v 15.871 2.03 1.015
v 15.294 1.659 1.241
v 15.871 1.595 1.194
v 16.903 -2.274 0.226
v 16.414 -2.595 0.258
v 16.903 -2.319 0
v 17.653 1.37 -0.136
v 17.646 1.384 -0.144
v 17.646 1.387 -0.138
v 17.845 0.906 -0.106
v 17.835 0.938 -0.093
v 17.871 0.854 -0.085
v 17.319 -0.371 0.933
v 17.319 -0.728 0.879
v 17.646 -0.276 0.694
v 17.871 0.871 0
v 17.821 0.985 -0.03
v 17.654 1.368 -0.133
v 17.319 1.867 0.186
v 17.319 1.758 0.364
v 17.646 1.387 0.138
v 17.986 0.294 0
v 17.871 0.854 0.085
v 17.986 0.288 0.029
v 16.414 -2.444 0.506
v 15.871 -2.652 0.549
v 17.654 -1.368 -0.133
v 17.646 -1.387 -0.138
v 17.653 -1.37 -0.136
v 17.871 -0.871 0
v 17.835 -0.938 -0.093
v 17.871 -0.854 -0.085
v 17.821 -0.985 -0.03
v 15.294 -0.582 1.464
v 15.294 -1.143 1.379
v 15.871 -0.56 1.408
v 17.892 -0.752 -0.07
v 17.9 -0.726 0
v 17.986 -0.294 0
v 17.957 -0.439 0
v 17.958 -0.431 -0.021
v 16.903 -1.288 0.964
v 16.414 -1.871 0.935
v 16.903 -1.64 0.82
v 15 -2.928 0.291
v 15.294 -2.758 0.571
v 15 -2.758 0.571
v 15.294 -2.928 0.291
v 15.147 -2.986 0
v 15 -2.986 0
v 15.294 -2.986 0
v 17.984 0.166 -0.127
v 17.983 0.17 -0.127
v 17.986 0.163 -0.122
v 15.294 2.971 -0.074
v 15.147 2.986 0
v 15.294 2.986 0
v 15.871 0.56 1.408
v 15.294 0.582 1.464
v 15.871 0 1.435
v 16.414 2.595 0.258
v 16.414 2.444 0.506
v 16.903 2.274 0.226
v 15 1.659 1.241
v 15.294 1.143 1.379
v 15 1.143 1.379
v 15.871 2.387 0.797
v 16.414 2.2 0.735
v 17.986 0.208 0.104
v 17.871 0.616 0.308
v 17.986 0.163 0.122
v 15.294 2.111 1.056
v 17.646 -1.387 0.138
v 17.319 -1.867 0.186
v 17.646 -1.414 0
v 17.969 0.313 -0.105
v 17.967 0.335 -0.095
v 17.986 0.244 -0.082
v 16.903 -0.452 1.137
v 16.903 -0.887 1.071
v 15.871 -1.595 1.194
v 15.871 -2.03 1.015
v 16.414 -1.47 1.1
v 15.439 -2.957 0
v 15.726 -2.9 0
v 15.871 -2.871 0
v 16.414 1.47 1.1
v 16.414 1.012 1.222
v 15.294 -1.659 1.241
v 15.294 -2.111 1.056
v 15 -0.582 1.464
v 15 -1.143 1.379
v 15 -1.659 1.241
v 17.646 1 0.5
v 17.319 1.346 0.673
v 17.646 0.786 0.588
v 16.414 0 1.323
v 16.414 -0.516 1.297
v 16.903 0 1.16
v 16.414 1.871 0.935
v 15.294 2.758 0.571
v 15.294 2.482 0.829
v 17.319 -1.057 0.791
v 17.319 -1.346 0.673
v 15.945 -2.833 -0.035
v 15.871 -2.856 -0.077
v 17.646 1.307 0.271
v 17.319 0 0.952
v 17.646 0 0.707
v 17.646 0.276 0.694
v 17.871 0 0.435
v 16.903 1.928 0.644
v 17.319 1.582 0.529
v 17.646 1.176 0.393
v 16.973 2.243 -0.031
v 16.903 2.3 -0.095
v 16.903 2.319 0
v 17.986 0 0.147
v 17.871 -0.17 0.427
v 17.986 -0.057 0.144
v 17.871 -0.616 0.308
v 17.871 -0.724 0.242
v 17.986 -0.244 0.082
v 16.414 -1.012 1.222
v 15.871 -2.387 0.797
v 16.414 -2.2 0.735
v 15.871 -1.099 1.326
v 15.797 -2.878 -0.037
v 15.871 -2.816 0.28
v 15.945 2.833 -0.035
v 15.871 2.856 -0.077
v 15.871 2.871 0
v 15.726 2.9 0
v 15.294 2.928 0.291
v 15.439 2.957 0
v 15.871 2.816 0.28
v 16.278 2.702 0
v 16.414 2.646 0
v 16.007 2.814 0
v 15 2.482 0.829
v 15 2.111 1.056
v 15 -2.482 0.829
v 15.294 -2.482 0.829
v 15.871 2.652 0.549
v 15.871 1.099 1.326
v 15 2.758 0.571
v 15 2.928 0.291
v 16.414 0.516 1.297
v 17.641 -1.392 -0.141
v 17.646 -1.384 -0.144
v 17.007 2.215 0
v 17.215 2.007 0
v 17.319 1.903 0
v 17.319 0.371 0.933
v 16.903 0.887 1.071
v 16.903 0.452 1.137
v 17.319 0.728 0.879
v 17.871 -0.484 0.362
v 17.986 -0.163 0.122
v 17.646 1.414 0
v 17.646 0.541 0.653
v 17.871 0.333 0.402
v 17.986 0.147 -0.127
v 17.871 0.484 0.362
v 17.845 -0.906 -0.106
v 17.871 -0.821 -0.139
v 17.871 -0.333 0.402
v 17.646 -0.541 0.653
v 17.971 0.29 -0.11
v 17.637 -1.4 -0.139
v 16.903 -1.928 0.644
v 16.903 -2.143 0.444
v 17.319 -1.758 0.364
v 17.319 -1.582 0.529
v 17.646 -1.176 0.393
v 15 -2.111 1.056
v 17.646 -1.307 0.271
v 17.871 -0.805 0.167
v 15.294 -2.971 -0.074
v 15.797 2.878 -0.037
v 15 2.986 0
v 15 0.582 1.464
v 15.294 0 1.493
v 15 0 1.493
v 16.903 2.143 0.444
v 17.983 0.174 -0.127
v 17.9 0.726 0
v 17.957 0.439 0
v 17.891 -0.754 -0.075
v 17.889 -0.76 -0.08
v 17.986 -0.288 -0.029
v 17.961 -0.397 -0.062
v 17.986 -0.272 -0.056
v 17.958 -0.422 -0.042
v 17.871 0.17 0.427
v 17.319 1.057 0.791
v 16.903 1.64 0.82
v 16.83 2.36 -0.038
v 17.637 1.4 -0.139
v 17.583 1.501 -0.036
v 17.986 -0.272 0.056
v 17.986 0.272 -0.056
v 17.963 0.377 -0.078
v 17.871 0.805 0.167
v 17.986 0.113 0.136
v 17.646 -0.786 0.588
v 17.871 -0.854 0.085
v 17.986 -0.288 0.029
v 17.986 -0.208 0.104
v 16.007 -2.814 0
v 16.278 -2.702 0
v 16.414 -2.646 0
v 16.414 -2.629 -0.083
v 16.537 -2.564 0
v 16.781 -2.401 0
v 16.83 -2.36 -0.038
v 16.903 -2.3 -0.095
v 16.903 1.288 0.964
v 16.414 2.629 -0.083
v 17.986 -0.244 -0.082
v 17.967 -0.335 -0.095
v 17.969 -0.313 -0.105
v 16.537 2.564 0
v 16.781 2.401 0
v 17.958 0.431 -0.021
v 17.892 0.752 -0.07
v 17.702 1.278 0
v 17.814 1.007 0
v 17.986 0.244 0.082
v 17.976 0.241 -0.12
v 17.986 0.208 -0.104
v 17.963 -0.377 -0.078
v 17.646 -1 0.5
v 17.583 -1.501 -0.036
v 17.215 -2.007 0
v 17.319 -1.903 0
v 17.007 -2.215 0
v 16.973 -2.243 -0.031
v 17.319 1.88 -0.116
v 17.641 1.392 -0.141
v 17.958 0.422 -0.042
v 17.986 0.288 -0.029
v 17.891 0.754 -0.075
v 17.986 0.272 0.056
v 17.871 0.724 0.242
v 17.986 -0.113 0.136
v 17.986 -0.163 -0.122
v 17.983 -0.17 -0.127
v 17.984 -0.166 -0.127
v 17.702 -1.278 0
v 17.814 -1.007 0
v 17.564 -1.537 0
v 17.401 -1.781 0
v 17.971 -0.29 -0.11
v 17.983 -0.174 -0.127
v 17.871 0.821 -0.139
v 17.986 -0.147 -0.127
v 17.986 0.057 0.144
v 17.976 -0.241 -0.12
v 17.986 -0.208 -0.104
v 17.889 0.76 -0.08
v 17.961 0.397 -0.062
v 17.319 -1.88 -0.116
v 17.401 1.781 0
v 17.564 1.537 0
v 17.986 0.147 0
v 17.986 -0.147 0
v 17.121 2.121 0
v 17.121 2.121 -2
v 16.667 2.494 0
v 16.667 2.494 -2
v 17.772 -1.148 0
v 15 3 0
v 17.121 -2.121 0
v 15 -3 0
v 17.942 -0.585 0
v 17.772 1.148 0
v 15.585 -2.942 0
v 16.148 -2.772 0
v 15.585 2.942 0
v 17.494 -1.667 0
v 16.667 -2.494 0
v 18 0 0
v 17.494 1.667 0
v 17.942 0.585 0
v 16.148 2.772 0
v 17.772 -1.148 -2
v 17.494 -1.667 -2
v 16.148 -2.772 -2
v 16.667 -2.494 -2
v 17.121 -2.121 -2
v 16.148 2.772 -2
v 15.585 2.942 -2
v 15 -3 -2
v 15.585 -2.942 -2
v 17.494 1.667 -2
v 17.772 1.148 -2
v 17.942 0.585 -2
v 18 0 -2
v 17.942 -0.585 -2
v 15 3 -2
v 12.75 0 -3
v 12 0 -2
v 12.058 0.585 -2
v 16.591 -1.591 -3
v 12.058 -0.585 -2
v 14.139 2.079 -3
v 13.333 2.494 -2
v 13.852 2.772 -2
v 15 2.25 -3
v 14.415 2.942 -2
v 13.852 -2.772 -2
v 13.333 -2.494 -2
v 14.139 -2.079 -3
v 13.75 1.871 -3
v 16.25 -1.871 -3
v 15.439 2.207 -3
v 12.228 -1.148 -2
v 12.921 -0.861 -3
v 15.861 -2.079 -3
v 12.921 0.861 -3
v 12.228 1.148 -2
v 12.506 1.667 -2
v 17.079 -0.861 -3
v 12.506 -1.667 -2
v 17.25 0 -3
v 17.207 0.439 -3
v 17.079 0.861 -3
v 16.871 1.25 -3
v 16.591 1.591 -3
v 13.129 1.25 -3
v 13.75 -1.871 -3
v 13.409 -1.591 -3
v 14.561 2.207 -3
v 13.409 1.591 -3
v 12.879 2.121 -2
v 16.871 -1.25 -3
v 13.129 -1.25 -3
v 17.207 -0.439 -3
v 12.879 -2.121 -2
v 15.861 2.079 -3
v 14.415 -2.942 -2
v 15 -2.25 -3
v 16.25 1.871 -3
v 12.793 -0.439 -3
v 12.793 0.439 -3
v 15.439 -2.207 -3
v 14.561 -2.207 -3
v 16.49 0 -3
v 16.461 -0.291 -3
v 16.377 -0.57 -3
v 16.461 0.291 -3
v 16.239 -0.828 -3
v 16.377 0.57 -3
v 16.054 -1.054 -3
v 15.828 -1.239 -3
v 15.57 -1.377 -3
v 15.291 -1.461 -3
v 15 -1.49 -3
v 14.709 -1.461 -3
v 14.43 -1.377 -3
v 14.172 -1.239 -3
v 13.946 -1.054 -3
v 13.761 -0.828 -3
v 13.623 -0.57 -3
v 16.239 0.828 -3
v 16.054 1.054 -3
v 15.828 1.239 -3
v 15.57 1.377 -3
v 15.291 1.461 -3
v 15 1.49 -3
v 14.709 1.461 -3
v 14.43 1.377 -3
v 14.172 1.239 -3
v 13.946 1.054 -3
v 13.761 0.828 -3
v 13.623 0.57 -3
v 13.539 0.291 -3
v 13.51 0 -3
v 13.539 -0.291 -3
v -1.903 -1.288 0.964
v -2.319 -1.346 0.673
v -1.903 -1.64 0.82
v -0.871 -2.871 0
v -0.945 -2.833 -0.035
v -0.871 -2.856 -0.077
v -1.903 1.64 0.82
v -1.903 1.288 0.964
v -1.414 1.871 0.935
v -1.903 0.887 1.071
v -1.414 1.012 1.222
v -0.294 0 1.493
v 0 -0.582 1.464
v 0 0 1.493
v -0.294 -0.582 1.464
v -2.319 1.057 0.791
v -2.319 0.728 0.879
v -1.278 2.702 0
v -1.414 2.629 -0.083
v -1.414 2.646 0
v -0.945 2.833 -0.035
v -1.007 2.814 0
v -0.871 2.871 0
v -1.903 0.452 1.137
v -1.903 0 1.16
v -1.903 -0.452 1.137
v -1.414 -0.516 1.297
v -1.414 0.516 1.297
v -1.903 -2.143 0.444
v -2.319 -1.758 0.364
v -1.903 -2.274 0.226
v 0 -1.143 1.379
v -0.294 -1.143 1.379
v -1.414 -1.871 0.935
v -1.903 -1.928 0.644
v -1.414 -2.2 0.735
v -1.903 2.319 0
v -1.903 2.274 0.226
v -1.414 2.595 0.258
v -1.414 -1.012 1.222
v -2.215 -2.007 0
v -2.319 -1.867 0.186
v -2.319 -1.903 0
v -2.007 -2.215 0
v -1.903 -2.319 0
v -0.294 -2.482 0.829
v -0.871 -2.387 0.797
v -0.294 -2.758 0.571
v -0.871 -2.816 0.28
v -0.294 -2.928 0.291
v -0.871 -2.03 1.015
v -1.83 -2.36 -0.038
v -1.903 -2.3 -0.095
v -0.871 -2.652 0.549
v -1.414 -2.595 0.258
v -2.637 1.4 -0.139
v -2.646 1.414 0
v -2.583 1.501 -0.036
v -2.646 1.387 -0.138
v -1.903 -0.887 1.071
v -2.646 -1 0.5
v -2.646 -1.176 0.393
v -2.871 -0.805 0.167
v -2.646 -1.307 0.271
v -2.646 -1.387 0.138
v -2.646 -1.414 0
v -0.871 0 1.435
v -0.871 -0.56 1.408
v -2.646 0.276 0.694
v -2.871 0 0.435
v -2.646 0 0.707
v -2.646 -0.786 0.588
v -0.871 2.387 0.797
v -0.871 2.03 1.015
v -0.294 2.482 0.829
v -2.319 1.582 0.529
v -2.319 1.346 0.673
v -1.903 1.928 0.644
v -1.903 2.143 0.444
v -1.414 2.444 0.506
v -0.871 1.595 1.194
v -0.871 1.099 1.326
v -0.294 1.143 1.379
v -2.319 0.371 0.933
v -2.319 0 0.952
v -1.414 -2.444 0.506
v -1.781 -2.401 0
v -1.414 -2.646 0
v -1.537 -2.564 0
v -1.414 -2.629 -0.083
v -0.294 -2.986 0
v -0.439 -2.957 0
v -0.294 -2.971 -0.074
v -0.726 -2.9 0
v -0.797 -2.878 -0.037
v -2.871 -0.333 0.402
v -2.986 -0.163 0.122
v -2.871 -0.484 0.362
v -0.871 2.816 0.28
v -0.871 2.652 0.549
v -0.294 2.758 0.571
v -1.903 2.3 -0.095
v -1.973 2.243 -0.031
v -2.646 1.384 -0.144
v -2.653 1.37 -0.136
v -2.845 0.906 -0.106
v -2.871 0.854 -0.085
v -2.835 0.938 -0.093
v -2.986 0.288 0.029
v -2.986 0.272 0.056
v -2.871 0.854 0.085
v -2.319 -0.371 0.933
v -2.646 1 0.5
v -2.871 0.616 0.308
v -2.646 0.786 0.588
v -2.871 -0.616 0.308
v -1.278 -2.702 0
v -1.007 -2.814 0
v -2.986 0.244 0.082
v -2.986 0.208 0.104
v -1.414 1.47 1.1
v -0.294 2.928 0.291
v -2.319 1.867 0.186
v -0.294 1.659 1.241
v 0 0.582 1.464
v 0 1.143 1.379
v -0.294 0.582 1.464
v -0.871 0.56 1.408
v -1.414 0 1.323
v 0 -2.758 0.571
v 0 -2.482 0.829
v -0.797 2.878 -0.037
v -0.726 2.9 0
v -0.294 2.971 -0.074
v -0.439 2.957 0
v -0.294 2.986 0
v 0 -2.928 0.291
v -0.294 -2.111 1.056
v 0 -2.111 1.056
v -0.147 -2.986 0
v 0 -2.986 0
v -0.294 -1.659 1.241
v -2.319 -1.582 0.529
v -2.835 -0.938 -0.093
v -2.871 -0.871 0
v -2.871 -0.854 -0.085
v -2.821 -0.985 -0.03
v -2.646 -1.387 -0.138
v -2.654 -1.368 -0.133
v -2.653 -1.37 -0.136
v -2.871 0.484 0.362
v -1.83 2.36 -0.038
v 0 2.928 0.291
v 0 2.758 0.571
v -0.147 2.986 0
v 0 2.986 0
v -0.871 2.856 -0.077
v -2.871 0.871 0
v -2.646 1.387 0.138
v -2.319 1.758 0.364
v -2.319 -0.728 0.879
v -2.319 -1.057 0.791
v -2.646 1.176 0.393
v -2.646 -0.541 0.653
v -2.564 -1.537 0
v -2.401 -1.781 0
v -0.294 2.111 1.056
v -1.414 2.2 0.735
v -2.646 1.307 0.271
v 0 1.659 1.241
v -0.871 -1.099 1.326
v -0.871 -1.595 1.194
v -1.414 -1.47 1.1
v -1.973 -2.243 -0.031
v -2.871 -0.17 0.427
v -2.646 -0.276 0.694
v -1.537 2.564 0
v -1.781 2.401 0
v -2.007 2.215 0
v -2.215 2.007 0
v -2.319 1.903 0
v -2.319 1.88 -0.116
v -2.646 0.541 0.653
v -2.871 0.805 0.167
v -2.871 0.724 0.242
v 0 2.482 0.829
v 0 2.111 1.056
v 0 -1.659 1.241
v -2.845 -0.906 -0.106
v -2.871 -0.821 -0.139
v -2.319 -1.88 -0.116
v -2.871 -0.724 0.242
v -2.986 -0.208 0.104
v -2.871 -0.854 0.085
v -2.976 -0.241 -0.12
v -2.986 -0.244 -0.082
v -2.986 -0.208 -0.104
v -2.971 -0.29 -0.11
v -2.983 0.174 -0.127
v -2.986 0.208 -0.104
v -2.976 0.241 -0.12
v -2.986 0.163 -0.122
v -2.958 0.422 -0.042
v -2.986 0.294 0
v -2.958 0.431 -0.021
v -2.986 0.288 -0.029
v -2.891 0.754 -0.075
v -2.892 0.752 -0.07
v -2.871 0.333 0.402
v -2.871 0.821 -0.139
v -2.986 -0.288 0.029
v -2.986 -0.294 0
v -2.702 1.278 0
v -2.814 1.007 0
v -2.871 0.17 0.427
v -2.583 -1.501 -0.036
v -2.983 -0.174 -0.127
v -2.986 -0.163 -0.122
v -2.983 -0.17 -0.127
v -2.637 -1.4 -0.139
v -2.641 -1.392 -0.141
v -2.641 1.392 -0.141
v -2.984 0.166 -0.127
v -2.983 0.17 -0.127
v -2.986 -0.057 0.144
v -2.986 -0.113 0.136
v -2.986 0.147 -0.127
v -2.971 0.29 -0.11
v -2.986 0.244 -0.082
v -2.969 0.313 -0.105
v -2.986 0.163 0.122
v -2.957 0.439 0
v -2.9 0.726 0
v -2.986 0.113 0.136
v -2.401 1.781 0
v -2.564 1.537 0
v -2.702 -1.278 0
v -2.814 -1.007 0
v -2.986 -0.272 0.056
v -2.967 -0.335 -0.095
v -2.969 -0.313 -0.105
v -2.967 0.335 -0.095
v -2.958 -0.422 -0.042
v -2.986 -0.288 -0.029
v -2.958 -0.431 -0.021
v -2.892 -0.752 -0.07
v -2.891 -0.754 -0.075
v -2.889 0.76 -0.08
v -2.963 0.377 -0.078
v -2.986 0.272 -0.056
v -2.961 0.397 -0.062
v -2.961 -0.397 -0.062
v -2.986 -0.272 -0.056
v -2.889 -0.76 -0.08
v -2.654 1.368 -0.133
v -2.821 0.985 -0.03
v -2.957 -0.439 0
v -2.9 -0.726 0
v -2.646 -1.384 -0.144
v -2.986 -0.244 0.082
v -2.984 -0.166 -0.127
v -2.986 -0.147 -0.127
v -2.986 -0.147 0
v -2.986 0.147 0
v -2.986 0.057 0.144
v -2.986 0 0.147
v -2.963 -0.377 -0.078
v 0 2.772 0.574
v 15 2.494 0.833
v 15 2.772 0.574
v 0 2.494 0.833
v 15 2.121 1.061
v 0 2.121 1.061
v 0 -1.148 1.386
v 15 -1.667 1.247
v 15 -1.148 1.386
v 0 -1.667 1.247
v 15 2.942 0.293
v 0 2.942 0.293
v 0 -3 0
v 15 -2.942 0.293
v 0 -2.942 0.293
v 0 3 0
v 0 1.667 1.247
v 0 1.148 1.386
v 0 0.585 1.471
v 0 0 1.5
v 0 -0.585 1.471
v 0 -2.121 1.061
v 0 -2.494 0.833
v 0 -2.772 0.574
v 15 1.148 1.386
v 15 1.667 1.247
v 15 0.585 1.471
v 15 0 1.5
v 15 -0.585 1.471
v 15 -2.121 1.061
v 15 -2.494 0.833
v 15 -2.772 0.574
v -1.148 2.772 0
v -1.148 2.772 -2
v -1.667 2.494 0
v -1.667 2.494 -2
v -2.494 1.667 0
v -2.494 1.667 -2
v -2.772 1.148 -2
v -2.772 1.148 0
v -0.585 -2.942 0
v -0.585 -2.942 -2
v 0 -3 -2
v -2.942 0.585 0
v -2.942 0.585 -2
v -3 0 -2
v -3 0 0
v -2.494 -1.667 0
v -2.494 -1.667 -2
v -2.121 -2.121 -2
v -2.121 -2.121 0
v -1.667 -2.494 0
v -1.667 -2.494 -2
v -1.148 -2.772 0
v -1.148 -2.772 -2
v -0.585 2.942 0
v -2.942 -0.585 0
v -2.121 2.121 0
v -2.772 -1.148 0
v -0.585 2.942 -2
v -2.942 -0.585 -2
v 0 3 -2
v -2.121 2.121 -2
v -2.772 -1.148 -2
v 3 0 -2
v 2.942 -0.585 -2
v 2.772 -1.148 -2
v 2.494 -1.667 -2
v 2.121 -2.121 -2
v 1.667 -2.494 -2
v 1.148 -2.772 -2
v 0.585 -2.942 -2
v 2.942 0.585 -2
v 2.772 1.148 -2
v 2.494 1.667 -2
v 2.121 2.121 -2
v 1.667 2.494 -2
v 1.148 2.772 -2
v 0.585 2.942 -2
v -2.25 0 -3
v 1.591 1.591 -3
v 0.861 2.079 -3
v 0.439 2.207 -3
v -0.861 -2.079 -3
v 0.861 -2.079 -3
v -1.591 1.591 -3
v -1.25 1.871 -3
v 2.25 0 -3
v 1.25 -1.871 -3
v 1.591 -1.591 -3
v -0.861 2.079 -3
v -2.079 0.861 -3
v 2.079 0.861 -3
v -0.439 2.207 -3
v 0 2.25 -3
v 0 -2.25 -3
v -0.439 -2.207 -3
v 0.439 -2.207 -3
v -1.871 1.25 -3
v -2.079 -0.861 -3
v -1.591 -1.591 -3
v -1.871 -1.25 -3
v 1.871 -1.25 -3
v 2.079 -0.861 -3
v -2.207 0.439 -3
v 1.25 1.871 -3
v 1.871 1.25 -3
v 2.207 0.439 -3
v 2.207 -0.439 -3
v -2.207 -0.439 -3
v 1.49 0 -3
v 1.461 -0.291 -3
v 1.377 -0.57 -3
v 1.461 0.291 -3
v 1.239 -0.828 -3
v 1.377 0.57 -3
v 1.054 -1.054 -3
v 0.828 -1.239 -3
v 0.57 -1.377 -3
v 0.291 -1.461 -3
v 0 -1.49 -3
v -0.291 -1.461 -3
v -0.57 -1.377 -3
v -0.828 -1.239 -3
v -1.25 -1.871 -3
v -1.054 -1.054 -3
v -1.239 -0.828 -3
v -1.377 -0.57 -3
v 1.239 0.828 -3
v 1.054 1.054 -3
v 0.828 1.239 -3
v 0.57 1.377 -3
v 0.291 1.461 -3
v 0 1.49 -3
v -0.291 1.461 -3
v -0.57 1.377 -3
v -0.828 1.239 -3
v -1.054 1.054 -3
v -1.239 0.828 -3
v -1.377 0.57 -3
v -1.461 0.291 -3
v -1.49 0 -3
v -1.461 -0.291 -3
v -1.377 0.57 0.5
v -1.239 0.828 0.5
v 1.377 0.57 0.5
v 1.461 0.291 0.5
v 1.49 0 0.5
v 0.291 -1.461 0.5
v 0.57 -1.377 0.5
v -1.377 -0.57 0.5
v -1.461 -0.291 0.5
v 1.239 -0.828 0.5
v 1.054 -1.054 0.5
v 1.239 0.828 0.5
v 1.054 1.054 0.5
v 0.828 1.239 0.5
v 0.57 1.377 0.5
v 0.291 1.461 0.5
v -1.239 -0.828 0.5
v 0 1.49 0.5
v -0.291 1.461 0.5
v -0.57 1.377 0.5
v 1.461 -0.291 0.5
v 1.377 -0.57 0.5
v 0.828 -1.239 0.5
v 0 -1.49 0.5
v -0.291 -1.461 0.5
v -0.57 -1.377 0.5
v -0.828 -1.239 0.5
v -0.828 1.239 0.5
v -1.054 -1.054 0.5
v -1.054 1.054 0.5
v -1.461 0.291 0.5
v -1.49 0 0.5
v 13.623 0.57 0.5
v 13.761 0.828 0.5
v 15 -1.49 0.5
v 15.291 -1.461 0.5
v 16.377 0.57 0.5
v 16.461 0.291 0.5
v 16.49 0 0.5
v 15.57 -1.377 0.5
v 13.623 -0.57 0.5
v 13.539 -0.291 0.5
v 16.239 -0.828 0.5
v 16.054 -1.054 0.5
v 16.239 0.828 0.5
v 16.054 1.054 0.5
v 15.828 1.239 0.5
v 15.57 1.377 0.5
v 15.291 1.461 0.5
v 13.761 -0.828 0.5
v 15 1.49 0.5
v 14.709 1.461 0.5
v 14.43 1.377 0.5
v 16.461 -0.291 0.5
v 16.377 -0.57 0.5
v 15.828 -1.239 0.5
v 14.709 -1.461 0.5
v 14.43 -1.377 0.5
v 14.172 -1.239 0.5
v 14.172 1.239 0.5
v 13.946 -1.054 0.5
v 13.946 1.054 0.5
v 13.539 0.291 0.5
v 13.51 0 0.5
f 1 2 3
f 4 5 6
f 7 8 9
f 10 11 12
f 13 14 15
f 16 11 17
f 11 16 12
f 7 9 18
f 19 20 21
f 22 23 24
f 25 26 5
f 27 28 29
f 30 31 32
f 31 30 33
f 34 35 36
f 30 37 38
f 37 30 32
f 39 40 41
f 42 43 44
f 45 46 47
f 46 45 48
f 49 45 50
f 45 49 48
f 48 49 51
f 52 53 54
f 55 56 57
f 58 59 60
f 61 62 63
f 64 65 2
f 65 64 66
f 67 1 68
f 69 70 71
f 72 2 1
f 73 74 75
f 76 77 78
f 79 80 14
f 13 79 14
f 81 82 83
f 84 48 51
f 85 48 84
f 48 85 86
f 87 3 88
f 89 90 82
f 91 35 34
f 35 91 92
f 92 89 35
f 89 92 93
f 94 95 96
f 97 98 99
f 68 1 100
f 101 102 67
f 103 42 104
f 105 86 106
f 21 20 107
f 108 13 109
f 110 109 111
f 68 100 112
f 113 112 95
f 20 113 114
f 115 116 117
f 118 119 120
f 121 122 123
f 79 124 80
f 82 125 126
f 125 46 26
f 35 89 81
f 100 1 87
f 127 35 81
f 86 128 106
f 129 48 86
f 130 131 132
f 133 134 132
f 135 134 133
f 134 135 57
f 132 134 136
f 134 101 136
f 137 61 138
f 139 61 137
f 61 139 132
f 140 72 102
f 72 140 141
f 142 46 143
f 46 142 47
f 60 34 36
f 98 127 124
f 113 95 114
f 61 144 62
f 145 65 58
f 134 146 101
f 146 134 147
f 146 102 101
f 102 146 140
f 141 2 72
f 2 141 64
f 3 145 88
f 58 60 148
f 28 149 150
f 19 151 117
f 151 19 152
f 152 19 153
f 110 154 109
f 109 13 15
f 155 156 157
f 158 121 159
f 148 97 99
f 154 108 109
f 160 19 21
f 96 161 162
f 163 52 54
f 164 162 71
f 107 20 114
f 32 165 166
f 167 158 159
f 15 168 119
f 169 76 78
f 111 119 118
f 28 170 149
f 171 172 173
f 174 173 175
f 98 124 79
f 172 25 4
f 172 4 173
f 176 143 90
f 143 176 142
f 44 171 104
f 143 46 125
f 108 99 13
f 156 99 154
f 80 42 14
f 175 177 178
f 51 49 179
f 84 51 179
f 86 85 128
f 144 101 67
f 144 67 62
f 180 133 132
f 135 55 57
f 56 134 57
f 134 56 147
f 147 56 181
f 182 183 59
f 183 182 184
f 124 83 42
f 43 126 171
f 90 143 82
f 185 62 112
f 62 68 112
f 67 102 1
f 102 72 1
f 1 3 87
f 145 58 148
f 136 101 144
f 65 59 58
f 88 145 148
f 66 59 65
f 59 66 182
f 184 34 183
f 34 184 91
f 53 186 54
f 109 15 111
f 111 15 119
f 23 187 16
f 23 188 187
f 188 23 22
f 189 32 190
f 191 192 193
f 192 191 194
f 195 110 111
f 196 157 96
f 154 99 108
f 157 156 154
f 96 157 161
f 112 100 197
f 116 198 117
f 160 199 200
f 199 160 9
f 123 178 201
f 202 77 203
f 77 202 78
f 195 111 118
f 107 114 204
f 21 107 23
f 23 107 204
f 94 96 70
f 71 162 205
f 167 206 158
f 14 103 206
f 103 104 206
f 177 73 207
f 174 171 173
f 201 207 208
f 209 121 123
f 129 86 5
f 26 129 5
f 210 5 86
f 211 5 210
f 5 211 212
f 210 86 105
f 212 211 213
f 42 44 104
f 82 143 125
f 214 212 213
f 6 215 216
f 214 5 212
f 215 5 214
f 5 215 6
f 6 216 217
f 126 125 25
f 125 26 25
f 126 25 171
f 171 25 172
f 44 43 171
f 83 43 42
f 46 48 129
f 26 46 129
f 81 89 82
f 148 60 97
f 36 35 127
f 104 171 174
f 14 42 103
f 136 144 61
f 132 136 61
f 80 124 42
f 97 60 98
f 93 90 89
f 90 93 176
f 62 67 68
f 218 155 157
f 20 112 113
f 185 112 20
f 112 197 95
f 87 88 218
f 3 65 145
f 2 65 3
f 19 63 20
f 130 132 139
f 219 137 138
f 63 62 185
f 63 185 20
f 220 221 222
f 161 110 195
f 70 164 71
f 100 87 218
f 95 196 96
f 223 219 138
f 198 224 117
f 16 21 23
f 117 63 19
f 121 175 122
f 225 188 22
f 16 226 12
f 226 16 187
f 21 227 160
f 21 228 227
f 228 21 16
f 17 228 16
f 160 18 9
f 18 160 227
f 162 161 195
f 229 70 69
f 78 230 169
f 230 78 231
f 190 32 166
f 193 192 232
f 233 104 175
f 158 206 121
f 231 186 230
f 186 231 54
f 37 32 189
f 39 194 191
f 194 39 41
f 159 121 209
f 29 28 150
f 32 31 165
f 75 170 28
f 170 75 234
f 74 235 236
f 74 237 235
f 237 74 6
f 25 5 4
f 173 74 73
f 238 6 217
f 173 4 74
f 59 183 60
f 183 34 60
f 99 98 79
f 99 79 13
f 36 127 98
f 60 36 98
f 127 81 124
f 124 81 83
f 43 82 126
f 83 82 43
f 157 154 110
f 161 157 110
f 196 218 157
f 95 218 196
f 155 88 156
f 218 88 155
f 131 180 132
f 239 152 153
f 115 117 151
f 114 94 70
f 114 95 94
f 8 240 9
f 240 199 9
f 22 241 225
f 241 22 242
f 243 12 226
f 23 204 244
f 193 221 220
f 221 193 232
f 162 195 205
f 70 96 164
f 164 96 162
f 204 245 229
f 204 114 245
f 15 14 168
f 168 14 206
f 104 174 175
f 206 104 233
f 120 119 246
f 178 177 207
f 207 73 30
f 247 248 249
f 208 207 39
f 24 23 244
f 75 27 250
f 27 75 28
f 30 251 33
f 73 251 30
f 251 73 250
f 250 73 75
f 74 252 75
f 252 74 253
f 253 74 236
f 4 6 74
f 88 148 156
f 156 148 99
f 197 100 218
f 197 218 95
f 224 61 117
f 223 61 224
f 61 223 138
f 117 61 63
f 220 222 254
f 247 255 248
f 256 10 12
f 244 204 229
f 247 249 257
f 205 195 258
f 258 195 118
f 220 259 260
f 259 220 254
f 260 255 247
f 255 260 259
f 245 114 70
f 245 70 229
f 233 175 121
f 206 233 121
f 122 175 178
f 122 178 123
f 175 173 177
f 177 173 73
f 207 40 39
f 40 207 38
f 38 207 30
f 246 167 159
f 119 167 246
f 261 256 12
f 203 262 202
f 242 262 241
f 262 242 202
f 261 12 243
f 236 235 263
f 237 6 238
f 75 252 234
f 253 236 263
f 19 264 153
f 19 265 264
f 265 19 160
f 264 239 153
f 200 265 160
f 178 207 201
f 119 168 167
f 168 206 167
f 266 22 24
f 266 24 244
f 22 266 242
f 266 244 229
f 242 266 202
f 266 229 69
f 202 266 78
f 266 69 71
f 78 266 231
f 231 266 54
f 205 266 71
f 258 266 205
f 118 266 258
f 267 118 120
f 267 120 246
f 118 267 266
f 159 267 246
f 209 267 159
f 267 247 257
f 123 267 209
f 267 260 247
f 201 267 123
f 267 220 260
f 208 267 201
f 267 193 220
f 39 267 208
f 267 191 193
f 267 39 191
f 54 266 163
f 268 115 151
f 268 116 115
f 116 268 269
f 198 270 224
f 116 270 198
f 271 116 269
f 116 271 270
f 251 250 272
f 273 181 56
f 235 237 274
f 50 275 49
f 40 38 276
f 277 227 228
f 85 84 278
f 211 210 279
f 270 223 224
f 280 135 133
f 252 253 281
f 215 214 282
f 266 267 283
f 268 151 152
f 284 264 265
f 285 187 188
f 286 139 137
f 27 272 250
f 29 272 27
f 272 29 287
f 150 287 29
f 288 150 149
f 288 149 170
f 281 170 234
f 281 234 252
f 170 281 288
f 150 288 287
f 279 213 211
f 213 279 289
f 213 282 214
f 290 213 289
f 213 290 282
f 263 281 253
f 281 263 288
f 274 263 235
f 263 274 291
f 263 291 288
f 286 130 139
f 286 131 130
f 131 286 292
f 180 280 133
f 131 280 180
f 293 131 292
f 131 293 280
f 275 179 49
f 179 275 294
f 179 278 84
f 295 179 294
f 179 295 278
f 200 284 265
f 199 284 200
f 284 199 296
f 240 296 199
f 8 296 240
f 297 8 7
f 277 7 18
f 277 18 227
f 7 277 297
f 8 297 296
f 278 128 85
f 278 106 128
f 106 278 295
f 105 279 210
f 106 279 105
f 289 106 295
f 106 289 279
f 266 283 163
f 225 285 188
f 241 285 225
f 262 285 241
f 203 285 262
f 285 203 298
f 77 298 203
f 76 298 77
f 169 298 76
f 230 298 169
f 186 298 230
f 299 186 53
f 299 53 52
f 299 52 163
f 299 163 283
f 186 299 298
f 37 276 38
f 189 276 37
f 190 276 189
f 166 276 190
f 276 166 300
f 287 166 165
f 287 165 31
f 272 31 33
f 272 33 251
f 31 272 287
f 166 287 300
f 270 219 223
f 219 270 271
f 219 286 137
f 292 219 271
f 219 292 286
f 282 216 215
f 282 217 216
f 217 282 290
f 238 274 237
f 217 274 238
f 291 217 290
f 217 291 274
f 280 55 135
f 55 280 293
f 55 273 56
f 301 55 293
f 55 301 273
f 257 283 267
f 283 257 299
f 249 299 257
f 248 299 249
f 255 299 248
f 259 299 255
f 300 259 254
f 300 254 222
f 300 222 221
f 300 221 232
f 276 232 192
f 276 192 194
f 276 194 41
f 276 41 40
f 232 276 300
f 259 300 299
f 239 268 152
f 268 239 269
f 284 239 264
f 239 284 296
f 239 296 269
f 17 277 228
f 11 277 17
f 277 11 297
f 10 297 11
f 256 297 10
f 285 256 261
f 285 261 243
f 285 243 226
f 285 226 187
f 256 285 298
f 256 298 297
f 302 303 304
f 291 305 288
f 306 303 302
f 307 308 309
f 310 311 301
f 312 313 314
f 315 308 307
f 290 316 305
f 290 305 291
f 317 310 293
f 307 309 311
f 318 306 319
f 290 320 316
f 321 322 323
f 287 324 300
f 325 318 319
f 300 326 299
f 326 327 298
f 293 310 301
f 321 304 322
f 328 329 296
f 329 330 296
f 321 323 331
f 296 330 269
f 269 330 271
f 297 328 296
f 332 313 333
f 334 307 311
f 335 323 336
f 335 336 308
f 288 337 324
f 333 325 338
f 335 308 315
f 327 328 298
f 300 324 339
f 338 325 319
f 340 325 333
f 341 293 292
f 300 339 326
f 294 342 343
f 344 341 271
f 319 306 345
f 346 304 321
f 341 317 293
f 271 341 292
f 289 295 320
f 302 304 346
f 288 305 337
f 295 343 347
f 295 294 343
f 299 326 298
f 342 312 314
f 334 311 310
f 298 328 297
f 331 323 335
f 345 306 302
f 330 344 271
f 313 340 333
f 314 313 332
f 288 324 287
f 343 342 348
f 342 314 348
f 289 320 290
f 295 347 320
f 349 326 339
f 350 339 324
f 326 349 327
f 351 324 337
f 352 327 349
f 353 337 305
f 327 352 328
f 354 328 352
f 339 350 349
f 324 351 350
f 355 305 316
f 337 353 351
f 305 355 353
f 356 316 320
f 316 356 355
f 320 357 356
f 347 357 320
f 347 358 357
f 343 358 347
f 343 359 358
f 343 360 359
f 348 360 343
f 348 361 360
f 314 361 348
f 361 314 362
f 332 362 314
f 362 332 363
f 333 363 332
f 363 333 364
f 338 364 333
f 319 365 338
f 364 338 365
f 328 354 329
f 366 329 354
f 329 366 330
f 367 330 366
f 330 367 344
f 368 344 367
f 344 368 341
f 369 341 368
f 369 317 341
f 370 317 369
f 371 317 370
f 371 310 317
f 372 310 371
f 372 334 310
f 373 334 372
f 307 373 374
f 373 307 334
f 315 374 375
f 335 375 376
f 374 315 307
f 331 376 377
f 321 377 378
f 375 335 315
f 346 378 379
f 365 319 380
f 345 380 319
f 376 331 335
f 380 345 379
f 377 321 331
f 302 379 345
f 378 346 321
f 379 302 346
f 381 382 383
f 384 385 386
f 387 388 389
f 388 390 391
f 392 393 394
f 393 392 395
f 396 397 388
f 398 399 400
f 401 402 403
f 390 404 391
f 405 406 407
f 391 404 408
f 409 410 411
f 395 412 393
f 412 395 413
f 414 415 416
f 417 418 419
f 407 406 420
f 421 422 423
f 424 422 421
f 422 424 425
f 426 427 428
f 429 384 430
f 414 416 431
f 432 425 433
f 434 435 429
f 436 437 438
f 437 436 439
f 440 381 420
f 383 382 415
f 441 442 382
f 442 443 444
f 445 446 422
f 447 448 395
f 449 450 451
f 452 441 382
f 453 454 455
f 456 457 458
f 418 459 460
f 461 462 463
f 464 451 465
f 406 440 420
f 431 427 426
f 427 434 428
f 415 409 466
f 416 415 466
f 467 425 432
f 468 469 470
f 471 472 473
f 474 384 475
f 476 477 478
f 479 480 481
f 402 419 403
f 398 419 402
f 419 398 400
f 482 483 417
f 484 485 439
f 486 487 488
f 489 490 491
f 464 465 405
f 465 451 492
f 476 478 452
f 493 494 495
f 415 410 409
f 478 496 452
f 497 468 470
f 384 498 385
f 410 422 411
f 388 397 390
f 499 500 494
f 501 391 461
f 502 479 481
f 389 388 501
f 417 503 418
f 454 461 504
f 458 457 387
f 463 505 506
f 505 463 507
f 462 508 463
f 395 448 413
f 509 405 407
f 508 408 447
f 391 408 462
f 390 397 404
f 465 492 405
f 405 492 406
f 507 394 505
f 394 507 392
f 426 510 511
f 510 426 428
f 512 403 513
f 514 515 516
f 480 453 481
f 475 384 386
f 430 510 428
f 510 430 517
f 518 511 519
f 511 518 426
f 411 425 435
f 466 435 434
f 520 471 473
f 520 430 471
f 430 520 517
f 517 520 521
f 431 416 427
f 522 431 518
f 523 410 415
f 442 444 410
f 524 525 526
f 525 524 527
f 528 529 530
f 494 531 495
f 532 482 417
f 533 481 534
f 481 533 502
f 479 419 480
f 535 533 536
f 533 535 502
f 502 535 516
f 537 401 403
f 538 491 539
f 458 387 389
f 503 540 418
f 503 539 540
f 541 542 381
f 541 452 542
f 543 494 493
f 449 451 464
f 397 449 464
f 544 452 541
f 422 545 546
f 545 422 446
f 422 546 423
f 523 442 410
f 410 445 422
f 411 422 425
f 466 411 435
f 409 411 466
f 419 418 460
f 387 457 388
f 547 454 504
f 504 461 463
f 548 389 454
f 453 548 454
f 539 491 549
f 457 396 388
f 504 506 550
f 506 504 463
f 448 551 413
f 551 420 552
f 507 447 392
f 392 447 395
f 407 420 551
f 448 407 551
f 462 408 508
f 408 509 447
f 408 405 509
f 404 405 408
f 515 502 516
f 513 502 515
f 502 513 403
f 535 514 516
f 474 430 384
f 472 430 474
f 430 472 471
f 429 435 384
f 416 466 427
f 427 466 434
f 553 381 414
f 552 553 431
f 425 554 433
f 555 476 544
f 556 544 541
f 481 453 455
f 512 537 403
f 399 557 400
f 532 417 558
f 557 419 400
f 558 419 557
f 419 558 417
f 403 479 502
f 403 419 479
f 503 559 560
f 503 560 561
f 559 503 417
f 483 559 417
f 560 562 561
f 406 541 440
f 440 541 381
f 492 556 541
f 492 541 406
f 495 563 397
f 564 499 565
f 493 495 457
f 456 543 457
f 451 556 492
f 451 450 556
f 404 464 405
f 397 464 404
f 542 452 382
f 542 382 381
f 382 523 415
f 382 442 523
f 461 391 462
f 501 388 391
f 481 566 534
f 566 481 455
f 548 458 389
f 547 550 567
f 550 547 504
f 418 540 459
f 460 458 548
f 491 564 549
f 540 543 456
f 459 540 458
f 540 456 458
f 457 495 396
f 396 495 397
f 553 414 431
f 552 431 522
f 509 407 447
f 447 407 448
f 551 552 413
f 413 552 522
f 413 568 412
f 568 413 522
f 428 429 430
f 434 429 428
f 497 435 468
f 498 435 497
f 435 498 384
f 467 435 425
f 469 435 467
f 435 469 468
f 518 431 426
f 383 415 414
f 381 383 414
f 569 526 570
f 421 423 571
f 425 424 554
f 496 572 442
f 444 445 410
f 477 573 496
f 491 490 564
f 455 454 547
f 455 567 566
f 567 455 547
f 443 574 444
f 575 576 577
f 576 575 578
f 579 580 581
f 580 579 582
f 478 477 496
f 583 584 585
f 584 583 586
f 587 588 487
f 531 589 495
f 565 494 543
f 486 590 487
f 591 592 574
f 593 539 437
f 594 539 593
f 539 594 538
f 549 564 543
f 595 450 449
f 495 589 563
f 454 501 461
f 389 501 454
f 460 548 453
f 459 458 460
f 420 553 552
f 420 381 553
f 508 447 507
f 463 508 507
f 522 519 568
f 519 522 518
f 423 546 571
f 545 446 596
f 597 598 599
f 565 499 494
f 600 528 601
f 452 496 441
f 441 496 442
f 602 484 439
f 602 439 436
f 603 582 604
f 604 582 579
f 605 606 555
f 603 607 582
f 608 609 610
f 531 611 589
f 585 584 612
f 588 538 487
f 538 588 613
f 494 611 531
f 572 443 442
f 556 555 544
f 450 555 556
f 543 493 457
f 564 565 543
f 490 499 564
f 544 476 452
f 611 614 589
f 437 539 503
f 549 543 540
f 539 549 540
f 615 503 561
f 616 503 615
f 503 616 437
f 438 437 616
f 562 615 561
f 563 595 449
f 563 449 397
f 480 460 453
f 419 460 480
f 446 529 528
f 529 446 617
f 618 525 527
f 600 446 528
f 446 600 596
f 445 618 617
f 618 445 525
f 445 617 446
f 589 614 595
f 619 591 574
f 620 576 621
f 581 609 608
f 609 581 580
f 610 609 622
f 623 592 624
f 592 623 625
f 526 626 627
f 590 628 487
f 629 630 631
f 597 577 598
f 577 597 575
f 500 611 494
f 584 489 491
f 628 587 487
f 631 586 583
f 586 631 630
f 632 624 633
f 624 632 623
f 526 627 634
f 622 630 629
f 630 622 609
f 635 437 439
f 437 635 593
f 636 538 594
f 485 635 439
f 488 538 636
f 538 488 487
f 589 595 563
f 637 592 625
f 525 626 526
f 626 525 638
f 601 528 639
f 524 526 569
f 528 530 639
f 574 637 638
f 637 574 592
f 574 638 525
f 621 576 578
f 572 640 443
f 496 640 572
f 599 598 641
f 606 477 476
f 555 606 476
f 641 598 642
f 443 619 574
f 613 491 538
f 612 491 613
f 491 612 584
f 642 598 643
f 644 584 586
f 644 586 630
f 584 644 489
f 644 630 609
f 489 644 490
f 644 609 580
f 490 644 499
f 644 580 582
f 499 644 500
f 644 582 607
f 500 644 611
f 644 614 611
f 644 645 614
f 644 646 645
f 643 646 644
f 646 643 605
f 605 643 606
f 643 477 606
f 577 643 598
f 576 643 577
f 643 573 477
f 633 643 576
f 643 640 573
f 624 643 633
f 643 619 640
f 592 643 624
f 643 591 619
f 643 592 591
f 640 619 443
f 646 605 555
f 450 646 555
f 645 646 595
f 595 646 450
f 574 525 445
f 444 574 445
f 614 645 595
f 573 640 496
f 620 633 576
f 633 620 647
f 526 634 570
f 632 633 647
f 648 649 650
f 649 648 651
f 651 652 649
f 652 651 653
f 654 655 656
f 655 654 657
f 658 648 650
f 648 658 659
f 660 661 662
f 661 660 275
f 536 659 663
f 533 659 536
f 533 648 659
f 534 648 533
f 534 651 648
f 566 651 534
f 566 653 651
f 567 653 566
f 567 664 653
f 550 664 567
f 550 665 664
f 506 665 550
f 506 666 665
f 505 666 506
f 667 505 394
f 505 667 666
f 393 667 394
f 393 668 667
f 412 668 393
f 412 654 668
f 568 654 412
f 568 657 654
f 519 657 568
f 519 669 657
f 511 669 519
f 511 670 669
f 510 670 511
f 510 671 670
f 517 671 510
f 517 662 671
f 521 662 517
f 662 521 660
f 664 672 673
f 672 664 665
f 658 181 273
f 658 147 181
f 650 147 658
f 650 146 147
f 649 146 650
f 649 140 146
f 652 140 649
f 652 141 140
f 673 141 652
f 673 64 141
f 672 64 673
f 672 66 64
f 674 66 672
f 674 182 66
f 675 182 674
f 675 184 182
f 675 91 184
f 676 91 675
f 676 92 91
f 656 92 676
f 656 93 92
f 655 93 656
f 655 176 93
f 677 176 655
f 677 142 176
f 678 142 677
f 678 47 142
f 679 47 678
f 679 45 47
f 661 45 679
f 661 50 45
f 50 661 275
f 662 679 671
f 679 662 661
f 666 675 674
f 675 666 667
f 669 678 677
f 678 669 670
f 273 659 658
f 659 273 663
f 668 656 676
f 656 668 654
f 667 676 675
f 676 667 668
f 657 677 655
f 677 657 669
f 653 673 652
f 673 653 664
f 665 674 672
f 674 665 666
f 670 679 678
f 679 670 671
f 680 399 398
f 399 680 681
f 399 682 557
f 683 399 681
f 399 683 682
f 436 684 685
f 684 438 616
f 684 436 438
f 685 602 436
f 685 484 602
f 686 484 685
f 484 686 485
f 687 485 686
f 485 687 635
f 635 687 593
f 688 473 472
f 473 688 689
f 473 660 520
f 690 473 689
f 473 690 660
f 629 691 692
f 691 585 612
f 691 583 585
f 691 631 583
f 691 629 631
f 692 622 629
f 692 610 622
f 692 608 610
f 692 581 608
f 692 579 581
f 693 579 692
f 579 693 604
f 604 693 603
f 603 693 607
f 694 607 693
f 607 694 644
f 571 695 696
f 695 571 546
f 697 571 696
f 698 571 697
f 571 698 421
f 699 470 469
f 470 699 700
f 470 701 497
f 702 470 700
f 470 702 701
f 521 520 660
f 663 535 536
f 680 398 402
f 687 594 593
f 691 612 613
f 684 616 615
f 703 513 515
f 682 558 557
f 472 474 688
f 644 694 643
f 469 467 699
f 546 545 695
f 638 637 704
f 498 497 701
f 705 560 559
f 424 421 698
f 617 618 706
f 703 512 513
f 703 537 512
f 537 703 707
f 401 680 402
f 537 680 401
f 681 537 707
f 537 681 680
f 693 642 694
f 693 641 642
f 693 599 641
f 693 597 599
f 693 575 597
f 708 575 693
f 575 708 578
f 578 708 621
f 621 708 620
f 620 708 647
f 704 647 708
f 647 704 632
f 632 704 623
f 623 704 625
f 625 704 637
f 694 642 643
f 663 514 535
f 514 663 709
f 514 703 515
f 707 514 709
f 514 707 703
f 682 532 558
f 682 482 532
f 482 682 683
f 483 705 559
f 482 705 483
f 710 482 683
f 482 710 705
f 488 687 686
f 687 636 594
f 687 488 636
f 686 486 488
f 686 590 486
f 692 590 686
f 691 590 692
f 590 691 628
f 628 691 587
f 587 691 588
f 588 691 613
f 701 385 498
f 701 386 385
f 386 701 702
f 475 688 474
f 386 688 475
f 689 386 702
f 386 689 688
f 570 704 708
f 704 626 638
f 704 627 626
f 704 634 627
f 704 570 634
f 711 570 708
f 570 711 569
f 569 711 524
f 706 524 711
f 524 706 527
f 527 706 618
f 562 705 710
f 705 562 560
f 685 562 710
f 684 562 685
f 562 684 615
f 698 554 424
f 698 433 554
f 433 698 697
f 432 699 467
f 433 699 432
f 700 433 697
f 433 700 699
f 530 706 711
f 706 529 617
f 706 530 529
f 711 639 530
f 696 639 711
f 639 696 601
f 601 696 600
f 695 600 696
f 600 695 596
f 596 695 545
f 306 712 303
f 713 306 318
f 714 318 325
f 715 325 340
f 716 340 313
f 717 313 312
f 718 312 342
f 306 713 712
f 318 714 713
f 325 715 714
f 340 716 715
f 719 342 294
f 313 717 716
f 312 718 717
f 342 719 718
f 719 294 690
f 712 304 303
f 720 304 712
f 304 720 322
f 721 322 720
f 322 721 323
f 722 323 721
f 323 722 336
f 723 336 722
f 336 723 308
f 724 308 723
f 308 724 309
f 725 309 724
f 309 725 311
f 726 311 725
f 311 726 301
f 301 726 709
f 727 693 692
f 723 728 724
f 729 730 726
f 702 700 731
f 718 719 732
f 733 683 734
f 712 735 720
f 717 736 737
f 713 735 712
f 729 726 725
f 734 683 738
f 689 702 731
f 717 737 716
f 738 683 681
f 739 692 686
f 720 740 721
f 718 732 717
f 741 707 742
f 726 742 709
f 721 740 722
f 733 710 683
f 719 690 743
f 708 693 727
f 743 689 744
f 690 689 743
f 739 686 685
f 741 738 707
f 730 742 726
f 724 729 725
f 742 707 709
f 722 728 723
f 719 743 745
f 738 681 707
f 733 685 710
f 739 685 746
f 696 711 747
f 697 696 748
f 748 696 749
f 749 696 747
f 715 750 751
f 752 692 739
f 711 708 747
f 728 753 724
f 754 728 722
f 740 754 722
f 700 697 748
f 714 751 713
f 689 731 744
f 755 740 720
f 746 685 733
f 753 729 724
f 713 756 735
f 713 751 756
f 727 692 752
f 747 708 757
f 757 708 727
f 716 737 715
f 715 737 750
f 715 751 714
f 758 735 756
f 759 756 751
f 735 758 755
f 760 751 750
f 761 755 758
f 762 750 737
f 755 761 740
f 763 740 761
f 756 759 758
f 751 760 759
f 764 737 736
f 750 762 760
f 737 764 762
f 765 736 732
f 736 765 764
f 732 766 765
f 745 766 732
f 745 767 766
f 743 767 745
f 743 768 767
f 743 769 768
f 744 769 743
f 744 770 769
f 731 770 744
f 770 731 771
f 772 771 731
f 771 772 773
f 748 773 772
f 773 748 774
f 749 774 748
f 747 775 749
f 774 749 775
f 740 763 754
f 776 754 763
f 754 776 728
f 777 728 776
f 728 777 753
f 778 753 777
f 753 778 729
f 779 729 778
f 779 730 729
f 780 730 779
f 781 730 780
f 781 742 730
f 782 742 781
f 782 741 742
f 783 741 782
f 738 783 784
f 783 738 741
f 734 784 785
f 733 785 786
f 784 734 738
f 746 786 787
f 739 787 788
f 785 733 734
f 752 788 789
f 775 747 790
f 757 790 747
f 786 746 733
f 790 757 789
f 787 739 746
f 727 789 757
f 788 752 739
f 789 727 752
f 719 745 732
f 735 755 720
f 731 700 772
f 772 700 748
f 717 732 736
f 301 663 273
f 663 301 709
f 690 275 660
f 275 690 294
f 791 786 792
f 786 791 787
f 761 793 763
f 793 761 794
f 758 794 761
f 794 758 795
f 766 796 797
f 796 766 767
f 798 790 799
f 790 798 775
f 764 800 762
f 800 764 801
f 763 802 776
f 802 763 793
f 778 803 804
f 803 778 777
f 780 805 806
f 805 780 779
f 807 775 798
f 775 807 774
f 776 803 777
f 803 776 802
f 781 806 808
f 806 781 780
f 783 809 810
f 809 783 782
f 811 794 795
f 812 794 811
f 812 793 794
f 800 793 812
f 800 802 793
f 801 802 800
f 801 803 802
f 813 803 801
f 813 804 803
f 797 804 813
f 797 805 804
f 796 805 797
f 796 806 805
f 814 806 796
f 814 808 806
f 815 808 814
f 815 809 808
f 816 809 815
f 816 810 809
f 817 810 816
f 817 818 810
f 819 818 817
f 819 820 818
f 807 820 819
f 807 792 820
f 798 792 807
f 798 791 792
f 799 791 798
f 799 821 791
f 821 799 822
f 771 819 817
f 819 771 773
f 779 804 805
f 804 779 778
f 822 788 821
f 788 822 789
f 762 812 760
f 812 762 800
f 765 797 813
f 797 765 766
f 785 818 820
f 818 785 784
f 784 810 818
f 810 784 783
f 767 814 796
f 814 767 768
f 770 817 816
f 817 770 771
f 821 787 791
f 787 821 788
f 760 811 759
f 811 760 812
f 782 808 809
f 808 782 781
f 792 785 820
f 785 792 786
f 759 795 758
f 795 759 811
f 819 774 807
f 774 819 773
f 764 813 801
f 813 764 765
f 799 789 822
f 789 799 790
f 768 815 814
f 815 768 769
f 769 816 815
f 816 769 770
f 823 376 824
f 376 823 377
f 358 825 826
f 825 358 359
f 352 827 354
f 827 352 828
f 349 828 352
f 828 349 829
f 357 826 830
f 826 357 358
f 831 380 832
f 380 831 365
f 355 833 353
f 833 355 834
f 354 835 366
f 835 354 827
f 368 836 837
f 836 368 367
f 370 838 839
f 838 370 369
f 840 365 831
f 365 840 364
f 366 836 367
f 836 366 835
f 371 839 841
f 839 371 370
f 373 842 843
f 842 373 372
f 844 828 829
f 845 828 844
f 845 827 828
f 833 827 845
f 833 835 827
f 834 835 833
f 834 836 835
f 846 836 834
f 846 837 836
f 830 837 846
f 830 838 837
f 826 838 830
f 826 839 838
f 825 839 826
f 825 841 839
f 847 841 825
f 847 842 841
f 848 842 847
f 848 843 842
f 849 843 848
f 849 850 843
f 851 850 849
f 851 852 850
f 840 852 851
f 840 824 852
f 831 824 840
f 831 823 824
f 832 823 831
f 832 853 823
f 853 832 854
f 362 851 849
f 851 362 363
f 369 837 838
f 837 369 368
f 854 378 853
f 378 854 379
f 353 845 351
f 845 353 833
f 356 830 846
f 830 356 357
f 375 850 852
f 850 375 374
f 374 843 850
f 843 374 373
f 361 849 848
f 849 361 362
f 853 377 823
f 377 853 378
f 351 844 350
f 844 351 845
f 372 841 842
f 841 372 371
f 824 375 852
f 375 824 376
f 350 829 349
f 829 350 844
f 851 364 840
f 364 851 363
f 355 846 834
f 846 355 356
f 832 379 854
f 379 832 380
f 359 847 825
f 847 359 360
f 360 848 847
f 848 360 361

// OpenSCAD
$fn=32;

l=15;
//l=0;

screwHoleR=1.49;


medalClip(l);

module medalClip(l) {
  r=3;
  
  color("silver") {
    difference() {
      scale([1,1,0.5]) rotate([0,90,0]) {
        sphere(r=r);
        cylinder(r=r,h=l);
        rotate([0,90,0]) cylinder(r=r,h=r+1);
        translate([4,0,0]) rotate([0,90,0]) cylinder(r1=r,r2=r-0.75,h=2);

        translate([0,-r,0]) cube([r+1,r*2,l]);
        
        translate([0,0,l]) {
          sphere(r=r);
          rotate([0,90,0]) cylinder(r=r,h=r+1);
          translate([4,0,0]) rotate([0,90,0]) cylinder(r1=r,r2=r-0.75,h=2);
        }
      }
      translate([0,0,-r-5.5]) cylinder(r=screwHoleR,h=r+6);
      translate([l,0,-r-5.5]) cylinder(r=screwHoleR,h=r+6);
    }
  }
}
